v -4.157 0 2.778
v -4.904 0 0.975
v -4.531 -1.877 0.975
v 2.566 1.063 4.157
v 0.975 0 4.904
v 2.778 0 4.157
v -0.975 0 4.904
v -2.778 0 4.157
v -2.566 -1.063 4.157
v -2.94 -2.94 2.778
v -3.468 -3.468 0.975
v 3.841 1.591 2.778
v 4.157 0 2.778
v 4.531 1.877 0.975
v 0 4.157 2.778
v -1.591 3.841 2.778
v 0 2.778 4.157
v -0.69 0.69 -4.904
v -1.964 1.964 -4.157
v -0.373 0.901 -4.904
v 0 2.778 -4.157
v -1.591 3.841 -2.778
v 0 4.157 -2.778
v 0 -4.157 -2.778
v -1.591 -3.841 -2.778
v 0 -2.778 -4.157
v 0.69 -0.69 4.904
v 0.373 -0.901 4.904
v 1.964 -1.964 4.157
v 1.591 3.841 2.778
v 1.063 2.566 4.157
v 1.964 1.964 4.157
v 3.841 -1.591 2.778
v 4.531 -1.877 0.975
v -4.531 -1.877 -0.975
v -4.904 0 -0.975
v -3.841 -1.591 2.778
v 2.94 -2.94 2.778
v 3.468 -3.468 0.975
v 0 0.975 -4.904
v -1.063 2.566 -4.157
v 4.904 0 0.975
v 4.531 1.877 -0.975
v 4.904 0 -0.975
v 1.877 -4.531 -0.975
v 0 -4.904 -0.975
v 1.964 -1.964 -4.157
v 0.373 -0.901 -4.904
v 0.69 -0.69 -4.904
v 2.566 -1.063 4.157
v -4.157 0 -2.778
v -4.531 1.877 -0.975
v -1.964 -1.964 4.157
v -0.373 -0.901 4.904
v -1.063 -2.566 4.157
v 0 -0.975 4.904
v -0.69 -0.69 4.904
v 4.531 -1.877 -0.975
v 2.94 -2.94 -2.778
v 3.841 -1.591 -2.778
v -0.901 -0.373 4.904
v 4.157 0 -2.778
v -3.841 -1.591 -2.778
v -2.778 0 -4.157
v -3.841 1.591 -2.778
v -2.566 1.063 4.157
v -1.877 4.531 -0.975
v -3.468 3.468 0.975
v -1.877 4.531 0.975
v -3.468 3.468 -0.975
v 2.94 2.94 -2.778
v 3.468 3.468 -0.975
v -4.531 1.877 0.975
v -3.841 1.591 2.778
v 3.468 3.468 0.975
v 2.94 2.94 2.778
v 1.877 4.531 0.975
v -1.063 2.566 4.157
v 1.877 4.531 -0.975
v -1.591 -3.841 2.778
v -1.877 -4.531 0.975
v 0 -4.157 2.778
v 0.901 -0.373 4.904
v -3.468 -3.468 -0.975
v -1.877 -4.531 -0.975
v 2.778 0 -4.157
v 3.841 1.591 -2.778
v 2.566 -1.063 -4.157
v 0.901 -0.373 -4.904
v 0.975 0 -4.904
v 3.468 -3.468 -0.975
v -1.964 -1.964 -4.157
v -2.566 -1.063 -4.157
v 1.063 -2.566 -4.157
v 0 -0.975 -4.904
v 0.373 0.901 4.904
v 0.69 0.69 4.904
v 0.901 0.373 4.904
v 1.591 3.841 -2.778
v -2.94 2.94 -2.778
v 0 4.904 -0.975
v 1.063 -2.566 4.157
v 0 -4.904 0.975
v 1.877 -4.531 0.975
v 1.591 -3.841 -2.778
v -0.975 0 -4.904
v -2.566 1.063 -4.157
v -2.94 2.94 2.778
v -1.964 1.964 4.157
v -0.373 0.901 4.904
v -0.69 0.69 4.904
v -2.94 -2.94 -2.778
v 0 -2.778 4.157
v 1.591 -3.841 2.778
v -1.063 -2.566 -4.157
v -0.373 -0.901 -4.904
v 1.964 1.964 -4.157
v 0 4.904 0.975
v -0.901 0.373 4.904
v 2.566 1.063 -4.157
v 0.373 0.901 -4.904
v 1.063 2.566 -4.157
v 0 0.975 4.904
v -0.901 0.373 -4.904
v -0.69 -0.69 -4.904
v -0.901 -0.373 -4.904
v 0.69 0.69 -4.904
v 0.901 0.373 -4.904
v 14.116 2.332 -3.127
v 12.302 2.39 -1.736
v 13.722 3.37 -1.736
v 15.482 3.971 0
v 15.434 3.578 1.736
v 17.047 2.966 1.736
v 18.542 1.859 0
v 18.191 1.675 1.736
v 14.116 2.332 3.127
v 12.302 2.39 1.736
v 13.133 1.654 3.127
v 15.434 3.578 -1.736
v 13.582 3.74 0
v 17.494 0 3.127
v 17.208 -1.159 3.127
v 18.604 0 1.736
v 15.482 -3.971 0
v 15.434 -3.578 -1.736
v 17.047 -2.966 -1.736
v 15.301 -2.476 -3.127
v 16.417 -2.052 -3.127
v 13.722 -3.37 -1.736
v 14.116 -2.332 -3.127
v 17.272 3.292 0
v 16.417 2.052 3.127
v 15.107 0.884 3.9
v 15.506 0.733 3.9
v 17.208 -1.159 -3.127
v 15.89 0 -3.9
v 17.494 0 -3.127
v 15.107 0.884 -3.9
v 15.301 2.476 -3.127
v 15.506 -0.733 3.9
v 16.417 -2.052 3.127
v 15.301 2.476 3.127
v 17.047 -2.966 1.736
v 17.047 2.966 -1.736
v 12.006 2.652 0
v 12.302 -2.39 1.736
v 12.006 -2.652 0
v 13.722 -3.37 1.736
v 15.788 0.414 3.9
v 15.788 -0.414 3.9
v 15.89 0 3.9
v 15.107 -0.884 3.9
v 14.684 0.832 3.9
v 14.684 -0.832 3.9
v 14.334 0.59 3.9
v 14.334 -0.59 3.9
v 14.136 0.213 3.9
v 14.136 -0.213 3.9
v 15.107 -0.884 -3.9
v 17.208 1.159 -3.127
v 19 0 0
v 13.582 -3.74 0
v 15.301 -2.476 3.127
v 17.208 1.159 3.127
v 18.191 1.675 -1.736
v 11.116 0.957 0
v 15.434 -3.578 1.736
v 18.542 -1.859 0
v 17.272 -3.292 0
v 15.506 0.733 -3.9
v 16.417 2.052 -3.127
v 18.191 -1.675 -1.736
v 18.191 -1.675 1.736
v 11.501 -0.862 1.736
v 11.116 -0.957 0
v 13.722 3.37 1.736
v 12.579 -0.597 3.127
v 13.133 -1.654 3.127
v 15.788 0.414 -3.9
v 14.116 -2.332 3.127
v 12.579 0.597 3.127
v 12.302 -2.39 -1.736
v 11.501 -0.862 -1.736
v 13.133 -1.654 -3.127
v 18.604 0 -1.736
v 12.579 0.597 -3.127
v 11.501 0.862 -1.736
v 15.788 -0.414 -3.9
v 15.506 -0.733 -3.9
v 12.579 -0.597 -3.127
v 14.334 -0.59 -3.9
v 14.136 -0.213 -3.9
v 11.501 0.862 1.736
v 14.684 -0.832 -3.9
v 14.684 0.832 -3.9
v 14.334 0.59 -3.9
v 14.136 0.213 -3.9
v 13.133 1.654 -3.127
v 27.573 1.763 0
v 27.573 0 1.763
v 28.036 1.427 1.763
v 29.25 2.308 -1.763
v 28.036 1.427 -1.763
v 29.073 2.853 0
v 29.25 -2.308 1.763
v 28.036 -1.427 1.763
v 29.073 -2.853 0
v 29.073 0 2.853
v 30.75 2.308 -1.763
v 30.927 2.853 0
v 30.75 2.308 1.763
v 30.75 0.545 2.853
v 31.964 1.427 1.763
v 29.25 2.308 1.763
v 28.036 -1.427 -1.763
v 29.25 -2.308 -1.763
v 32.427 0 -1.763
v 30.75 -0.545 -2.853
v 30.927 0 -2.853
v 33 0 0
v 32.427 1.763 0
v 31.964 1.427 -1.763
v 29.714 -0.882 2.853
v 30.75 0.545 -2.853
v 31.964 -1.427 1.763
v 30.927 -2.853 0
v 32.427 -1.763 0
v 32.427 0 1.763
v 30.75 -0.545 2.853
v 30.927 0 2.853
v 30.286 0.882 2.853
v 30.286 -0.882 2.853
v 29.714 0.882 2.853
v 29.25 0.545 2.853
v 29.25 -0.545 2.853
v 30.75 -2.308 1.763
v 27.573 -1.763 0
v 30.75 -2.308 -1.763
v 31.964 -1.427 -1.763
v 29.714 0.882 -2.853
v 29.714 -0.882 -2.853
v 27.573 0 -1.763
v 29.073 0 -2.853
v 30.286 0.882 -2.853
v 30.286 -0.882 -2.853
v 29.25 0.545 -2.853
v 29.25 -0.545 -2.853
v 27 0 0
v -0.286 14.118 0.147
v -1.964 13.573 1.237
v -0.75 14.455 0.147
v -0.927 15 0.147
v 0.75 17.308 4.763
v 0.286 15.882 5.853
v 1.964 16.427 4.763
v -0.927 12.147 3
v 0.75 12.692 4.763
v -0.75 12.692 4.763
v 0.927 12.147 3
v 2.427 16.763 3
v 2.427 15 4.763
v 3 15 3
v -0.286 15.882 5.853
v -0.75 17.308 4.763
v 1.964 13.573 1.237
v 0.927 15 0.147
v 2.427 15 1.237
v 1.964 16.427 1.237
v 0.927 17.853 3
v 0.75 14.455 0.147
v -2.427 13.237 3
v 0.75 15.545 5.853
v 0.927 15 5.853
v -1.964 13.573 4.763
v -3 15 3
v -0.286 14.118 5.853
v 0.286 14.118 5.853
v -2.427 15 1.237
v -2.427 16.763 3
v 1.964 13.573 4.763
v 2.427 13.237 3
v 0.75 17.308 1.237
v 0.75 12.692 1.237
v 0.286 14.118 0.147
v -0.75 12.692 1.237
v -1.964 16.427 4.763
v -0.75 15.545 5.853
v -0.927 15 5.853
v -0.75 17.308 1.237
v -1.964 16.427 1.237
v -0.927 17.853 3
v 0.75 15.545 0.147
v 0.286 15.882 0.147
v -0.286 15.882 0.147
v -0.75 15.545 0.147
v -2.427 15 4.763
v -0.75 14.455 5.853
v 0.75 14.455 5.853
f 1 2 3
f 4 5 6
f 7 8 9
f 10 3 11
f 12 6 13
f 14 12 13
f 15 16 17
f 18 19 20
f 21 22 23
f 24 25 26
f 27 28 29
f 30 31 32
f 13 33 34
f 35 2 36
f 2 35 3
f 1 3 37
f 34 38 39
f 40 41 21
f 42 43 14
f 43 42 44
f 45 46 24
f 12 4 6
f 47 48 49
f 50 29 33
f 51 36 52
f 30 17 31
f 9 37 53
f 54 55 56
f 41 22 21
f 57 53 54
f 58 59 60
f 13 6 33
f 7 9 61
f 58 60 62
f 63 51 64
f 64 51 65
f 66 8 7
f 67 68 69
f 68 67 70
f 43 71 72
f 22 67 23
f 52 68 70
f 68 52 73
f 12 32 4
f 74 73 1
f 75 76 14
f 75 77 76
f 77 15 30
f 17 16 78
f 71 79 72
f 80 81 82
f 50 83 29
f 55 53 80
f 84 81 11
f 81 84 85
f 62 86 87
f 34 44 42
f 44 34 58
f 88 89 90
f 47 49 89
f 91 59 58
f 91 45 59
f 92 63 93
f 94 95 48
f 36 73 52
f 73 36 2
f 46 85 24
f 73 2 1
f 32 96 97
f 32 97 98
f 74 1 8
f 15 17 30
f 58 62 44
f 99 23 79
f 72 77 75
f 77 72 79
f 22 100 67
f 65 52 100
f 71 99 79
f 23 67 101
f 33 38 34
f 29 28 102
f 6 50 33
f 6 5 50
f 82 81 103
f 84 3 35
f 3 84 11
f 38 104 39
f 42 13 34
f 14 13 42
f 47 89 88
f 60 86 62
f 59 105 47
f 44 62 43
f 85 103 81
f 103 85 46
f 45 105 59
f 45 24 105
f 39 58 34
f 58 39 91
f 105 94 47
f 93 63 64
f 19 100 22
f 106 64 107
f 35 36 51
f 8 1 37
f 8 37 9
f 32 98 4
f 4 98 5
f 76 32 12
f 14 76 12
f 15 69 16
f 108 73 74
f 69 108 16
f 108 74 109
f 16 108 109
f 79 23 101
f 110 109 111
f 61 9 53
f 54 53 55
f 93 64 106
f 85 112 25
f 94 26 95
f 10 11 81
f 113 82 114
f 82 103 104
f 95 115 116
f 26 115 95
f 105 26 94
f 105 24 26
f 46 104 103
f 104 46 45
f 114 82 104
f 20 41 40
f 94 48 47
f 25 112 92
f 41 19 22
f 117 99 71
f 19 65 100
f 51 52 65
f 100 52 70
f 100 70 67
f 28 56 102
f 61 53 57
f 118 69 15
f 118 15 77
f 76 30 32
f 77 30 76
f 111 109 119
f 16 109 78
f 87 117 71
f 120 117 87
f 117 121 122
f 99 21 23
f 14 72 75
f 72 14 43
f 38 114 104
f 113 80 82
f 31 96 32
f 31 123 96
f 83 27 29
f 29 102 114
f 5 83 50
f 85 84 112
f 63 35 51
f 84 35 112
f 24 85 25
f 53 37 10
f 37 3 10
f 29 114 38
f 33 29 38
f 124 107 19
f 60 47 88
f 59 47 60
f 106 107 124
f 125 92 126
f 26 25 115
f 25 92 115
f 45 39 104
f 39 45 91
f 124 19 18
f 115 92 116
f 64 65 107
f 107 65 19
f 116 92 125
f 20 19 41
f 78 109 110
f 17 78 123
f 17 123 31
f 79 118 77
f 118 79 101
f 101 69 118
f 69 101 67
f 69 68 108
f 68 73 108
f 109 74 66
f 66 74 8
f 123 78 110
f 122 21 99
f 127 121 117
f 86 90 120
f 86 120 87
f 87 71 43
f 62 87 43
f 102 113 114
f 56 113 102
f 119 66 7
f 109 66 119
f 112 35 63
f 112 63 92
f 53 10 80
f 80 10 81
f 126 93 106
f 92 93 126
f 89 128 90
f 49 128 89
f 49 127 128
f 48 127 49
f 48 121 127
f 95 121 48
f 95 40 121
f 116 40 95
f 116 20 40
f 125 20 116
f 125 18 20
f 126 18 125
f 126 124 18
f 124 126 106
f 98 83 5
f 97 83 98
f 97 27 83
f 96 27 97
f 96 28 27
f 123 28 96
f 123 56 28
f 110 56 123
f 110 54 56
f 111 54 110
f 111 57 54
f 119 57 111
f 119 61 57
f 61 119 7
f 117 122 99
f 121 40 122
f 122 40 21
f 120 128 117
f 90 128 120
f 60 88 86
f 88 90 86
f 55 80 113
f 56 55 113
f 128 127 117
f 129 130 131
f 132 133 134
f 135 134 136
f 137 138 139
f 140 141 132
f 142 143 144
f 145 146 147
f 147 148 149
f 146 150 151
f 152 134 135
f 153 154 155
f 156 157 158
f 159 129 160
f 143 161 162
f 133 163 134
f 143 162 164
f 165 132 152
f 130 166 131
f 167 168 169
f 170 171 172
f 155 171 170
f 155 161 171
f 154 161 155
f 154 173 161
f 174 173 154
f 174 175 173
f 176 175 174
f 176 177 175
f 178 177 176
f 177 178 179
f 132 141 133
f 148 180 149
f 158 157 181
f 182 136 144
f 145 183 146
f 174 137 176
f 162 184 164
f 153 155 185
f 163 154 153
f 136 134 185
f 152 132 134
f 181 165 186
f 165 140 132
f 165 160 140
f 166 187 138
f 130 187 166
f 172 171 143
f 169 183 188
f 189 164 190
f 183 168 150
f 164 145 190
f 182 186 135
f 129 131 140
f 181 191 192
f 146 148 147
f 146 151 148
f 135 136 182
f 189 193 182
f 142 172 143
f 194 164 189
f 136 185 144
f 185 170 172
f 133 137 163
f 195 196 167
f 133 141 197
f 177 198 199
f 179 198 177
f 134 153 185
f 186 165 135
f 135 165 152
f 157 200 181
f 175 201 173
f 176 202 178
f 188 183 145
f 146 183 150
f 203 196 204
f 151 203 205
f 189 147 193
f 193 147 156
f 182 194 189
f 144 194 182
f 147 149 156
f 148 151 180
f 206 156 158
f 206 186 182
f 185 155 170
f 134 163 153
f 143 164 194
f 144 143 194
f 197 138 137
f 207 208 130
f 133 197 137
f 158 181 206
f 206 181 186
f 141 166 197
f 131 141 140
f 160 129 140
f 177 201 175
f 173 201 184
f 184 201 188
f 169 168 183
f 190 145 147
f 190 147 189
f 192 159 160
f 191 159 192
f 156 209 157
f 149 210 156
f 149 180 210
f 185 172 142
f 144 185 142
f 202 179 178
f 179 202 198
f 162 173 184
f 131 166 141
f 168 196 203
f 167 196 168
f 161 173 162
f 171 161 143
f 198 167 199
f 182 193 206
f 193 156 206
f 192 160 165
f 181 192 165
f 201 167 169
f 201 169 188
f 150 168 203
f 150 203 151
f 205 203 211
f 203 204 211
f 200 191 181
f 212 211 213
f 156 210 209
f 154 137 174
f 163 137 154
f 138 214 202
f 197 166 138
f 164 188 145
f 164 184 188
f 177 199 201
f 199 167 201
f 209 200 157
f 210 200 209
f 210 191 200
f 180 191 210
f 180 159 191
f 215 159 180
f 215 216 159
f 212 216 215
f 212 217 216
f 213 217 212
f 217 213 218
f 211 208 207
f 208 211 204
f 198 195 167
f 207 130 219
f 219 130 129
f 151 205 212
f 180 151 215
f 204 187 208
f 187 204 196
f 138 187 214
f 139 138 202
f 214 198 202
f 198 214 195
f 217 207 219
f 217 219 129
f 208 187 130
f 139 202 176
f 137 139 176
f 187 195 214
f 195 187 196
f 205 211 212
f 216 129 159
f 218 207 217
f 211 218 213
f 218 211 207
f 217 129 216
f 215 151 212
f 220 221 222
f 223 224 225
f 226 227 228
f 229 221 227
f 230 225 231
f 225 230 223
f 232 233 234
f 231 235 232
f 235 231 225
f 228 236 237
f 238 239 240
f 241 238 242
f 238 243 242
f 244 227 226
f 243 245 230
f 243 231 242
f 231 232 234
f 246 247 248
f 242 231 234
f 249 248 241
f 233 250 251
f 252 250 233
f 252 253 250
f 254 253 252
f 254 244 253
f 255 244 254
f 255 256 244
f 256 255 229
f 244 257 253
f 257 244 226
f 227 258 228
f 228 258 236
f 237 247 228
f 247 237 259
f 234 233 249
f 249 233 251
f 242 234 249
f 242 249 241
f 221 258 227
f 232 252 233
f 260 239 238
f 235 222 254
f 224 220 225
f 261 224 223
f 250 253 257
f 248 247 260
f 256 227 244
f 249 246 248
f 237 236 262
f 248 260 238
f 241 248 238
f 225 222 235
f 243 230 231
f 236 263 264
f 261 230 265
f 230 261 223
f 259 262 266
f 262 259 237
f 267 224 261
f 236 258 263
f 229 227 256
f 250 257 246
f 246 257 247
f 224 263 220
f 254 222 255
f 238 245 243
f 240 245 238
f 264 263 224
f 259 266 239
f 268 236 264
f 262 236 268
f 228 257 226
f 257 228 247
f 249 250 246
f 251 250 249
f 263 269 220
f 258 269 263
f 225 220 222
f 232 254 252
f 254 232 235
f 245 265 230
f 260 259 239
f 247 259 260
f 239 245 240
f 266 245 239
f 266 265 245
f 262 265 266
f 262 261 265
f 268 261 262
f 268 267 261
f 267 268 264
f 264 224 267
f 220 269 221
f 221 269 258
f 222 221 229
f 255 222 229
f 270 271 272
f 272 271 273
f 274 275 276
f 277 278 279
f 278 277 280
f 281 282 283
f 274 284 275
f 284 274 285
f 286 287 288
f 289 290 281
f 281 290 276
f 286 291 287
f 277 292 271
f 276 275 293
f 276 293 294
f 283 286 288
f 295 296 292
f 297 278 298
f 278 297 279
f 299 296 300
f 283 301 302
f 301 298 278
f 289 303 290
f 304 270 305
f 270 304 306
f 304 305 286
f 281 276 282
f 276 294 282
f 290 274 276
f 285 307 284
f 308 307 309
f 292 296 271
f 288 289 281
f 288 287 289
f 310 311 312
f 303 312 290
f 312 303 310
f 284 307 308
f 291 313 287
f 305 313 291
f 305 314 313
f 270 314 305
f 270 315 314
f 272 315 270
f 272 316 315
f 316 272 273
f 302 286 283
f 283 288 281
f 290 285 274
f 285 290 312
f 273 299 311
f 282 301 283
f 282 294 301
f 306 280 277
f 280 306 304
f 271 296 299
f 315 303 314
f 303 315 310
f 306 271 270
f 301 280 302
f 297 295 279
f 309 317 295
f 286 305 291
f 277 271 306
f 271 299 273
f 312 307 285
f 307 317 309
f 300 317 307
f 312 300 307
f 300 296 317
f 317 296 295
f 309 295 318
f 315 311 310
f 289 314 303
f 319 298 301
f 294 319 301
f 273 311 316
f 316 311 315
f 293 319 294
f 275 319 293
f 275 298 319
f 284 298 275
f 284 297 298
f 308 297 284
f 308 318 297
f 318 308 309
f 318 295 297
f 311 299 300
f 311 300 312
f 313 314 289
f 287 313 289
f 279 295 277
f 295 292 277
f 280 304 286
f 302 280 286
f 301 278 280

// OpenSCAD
// Zweck: sphere mit r, d und als Positionsargument, verschoben.
sphere(5);
translate([15, 0, 0]) sphere(r = 4);
translate([30, 0, 0]) sphere(d = 6);
translate([0, 15, 3]) sphere(3);
